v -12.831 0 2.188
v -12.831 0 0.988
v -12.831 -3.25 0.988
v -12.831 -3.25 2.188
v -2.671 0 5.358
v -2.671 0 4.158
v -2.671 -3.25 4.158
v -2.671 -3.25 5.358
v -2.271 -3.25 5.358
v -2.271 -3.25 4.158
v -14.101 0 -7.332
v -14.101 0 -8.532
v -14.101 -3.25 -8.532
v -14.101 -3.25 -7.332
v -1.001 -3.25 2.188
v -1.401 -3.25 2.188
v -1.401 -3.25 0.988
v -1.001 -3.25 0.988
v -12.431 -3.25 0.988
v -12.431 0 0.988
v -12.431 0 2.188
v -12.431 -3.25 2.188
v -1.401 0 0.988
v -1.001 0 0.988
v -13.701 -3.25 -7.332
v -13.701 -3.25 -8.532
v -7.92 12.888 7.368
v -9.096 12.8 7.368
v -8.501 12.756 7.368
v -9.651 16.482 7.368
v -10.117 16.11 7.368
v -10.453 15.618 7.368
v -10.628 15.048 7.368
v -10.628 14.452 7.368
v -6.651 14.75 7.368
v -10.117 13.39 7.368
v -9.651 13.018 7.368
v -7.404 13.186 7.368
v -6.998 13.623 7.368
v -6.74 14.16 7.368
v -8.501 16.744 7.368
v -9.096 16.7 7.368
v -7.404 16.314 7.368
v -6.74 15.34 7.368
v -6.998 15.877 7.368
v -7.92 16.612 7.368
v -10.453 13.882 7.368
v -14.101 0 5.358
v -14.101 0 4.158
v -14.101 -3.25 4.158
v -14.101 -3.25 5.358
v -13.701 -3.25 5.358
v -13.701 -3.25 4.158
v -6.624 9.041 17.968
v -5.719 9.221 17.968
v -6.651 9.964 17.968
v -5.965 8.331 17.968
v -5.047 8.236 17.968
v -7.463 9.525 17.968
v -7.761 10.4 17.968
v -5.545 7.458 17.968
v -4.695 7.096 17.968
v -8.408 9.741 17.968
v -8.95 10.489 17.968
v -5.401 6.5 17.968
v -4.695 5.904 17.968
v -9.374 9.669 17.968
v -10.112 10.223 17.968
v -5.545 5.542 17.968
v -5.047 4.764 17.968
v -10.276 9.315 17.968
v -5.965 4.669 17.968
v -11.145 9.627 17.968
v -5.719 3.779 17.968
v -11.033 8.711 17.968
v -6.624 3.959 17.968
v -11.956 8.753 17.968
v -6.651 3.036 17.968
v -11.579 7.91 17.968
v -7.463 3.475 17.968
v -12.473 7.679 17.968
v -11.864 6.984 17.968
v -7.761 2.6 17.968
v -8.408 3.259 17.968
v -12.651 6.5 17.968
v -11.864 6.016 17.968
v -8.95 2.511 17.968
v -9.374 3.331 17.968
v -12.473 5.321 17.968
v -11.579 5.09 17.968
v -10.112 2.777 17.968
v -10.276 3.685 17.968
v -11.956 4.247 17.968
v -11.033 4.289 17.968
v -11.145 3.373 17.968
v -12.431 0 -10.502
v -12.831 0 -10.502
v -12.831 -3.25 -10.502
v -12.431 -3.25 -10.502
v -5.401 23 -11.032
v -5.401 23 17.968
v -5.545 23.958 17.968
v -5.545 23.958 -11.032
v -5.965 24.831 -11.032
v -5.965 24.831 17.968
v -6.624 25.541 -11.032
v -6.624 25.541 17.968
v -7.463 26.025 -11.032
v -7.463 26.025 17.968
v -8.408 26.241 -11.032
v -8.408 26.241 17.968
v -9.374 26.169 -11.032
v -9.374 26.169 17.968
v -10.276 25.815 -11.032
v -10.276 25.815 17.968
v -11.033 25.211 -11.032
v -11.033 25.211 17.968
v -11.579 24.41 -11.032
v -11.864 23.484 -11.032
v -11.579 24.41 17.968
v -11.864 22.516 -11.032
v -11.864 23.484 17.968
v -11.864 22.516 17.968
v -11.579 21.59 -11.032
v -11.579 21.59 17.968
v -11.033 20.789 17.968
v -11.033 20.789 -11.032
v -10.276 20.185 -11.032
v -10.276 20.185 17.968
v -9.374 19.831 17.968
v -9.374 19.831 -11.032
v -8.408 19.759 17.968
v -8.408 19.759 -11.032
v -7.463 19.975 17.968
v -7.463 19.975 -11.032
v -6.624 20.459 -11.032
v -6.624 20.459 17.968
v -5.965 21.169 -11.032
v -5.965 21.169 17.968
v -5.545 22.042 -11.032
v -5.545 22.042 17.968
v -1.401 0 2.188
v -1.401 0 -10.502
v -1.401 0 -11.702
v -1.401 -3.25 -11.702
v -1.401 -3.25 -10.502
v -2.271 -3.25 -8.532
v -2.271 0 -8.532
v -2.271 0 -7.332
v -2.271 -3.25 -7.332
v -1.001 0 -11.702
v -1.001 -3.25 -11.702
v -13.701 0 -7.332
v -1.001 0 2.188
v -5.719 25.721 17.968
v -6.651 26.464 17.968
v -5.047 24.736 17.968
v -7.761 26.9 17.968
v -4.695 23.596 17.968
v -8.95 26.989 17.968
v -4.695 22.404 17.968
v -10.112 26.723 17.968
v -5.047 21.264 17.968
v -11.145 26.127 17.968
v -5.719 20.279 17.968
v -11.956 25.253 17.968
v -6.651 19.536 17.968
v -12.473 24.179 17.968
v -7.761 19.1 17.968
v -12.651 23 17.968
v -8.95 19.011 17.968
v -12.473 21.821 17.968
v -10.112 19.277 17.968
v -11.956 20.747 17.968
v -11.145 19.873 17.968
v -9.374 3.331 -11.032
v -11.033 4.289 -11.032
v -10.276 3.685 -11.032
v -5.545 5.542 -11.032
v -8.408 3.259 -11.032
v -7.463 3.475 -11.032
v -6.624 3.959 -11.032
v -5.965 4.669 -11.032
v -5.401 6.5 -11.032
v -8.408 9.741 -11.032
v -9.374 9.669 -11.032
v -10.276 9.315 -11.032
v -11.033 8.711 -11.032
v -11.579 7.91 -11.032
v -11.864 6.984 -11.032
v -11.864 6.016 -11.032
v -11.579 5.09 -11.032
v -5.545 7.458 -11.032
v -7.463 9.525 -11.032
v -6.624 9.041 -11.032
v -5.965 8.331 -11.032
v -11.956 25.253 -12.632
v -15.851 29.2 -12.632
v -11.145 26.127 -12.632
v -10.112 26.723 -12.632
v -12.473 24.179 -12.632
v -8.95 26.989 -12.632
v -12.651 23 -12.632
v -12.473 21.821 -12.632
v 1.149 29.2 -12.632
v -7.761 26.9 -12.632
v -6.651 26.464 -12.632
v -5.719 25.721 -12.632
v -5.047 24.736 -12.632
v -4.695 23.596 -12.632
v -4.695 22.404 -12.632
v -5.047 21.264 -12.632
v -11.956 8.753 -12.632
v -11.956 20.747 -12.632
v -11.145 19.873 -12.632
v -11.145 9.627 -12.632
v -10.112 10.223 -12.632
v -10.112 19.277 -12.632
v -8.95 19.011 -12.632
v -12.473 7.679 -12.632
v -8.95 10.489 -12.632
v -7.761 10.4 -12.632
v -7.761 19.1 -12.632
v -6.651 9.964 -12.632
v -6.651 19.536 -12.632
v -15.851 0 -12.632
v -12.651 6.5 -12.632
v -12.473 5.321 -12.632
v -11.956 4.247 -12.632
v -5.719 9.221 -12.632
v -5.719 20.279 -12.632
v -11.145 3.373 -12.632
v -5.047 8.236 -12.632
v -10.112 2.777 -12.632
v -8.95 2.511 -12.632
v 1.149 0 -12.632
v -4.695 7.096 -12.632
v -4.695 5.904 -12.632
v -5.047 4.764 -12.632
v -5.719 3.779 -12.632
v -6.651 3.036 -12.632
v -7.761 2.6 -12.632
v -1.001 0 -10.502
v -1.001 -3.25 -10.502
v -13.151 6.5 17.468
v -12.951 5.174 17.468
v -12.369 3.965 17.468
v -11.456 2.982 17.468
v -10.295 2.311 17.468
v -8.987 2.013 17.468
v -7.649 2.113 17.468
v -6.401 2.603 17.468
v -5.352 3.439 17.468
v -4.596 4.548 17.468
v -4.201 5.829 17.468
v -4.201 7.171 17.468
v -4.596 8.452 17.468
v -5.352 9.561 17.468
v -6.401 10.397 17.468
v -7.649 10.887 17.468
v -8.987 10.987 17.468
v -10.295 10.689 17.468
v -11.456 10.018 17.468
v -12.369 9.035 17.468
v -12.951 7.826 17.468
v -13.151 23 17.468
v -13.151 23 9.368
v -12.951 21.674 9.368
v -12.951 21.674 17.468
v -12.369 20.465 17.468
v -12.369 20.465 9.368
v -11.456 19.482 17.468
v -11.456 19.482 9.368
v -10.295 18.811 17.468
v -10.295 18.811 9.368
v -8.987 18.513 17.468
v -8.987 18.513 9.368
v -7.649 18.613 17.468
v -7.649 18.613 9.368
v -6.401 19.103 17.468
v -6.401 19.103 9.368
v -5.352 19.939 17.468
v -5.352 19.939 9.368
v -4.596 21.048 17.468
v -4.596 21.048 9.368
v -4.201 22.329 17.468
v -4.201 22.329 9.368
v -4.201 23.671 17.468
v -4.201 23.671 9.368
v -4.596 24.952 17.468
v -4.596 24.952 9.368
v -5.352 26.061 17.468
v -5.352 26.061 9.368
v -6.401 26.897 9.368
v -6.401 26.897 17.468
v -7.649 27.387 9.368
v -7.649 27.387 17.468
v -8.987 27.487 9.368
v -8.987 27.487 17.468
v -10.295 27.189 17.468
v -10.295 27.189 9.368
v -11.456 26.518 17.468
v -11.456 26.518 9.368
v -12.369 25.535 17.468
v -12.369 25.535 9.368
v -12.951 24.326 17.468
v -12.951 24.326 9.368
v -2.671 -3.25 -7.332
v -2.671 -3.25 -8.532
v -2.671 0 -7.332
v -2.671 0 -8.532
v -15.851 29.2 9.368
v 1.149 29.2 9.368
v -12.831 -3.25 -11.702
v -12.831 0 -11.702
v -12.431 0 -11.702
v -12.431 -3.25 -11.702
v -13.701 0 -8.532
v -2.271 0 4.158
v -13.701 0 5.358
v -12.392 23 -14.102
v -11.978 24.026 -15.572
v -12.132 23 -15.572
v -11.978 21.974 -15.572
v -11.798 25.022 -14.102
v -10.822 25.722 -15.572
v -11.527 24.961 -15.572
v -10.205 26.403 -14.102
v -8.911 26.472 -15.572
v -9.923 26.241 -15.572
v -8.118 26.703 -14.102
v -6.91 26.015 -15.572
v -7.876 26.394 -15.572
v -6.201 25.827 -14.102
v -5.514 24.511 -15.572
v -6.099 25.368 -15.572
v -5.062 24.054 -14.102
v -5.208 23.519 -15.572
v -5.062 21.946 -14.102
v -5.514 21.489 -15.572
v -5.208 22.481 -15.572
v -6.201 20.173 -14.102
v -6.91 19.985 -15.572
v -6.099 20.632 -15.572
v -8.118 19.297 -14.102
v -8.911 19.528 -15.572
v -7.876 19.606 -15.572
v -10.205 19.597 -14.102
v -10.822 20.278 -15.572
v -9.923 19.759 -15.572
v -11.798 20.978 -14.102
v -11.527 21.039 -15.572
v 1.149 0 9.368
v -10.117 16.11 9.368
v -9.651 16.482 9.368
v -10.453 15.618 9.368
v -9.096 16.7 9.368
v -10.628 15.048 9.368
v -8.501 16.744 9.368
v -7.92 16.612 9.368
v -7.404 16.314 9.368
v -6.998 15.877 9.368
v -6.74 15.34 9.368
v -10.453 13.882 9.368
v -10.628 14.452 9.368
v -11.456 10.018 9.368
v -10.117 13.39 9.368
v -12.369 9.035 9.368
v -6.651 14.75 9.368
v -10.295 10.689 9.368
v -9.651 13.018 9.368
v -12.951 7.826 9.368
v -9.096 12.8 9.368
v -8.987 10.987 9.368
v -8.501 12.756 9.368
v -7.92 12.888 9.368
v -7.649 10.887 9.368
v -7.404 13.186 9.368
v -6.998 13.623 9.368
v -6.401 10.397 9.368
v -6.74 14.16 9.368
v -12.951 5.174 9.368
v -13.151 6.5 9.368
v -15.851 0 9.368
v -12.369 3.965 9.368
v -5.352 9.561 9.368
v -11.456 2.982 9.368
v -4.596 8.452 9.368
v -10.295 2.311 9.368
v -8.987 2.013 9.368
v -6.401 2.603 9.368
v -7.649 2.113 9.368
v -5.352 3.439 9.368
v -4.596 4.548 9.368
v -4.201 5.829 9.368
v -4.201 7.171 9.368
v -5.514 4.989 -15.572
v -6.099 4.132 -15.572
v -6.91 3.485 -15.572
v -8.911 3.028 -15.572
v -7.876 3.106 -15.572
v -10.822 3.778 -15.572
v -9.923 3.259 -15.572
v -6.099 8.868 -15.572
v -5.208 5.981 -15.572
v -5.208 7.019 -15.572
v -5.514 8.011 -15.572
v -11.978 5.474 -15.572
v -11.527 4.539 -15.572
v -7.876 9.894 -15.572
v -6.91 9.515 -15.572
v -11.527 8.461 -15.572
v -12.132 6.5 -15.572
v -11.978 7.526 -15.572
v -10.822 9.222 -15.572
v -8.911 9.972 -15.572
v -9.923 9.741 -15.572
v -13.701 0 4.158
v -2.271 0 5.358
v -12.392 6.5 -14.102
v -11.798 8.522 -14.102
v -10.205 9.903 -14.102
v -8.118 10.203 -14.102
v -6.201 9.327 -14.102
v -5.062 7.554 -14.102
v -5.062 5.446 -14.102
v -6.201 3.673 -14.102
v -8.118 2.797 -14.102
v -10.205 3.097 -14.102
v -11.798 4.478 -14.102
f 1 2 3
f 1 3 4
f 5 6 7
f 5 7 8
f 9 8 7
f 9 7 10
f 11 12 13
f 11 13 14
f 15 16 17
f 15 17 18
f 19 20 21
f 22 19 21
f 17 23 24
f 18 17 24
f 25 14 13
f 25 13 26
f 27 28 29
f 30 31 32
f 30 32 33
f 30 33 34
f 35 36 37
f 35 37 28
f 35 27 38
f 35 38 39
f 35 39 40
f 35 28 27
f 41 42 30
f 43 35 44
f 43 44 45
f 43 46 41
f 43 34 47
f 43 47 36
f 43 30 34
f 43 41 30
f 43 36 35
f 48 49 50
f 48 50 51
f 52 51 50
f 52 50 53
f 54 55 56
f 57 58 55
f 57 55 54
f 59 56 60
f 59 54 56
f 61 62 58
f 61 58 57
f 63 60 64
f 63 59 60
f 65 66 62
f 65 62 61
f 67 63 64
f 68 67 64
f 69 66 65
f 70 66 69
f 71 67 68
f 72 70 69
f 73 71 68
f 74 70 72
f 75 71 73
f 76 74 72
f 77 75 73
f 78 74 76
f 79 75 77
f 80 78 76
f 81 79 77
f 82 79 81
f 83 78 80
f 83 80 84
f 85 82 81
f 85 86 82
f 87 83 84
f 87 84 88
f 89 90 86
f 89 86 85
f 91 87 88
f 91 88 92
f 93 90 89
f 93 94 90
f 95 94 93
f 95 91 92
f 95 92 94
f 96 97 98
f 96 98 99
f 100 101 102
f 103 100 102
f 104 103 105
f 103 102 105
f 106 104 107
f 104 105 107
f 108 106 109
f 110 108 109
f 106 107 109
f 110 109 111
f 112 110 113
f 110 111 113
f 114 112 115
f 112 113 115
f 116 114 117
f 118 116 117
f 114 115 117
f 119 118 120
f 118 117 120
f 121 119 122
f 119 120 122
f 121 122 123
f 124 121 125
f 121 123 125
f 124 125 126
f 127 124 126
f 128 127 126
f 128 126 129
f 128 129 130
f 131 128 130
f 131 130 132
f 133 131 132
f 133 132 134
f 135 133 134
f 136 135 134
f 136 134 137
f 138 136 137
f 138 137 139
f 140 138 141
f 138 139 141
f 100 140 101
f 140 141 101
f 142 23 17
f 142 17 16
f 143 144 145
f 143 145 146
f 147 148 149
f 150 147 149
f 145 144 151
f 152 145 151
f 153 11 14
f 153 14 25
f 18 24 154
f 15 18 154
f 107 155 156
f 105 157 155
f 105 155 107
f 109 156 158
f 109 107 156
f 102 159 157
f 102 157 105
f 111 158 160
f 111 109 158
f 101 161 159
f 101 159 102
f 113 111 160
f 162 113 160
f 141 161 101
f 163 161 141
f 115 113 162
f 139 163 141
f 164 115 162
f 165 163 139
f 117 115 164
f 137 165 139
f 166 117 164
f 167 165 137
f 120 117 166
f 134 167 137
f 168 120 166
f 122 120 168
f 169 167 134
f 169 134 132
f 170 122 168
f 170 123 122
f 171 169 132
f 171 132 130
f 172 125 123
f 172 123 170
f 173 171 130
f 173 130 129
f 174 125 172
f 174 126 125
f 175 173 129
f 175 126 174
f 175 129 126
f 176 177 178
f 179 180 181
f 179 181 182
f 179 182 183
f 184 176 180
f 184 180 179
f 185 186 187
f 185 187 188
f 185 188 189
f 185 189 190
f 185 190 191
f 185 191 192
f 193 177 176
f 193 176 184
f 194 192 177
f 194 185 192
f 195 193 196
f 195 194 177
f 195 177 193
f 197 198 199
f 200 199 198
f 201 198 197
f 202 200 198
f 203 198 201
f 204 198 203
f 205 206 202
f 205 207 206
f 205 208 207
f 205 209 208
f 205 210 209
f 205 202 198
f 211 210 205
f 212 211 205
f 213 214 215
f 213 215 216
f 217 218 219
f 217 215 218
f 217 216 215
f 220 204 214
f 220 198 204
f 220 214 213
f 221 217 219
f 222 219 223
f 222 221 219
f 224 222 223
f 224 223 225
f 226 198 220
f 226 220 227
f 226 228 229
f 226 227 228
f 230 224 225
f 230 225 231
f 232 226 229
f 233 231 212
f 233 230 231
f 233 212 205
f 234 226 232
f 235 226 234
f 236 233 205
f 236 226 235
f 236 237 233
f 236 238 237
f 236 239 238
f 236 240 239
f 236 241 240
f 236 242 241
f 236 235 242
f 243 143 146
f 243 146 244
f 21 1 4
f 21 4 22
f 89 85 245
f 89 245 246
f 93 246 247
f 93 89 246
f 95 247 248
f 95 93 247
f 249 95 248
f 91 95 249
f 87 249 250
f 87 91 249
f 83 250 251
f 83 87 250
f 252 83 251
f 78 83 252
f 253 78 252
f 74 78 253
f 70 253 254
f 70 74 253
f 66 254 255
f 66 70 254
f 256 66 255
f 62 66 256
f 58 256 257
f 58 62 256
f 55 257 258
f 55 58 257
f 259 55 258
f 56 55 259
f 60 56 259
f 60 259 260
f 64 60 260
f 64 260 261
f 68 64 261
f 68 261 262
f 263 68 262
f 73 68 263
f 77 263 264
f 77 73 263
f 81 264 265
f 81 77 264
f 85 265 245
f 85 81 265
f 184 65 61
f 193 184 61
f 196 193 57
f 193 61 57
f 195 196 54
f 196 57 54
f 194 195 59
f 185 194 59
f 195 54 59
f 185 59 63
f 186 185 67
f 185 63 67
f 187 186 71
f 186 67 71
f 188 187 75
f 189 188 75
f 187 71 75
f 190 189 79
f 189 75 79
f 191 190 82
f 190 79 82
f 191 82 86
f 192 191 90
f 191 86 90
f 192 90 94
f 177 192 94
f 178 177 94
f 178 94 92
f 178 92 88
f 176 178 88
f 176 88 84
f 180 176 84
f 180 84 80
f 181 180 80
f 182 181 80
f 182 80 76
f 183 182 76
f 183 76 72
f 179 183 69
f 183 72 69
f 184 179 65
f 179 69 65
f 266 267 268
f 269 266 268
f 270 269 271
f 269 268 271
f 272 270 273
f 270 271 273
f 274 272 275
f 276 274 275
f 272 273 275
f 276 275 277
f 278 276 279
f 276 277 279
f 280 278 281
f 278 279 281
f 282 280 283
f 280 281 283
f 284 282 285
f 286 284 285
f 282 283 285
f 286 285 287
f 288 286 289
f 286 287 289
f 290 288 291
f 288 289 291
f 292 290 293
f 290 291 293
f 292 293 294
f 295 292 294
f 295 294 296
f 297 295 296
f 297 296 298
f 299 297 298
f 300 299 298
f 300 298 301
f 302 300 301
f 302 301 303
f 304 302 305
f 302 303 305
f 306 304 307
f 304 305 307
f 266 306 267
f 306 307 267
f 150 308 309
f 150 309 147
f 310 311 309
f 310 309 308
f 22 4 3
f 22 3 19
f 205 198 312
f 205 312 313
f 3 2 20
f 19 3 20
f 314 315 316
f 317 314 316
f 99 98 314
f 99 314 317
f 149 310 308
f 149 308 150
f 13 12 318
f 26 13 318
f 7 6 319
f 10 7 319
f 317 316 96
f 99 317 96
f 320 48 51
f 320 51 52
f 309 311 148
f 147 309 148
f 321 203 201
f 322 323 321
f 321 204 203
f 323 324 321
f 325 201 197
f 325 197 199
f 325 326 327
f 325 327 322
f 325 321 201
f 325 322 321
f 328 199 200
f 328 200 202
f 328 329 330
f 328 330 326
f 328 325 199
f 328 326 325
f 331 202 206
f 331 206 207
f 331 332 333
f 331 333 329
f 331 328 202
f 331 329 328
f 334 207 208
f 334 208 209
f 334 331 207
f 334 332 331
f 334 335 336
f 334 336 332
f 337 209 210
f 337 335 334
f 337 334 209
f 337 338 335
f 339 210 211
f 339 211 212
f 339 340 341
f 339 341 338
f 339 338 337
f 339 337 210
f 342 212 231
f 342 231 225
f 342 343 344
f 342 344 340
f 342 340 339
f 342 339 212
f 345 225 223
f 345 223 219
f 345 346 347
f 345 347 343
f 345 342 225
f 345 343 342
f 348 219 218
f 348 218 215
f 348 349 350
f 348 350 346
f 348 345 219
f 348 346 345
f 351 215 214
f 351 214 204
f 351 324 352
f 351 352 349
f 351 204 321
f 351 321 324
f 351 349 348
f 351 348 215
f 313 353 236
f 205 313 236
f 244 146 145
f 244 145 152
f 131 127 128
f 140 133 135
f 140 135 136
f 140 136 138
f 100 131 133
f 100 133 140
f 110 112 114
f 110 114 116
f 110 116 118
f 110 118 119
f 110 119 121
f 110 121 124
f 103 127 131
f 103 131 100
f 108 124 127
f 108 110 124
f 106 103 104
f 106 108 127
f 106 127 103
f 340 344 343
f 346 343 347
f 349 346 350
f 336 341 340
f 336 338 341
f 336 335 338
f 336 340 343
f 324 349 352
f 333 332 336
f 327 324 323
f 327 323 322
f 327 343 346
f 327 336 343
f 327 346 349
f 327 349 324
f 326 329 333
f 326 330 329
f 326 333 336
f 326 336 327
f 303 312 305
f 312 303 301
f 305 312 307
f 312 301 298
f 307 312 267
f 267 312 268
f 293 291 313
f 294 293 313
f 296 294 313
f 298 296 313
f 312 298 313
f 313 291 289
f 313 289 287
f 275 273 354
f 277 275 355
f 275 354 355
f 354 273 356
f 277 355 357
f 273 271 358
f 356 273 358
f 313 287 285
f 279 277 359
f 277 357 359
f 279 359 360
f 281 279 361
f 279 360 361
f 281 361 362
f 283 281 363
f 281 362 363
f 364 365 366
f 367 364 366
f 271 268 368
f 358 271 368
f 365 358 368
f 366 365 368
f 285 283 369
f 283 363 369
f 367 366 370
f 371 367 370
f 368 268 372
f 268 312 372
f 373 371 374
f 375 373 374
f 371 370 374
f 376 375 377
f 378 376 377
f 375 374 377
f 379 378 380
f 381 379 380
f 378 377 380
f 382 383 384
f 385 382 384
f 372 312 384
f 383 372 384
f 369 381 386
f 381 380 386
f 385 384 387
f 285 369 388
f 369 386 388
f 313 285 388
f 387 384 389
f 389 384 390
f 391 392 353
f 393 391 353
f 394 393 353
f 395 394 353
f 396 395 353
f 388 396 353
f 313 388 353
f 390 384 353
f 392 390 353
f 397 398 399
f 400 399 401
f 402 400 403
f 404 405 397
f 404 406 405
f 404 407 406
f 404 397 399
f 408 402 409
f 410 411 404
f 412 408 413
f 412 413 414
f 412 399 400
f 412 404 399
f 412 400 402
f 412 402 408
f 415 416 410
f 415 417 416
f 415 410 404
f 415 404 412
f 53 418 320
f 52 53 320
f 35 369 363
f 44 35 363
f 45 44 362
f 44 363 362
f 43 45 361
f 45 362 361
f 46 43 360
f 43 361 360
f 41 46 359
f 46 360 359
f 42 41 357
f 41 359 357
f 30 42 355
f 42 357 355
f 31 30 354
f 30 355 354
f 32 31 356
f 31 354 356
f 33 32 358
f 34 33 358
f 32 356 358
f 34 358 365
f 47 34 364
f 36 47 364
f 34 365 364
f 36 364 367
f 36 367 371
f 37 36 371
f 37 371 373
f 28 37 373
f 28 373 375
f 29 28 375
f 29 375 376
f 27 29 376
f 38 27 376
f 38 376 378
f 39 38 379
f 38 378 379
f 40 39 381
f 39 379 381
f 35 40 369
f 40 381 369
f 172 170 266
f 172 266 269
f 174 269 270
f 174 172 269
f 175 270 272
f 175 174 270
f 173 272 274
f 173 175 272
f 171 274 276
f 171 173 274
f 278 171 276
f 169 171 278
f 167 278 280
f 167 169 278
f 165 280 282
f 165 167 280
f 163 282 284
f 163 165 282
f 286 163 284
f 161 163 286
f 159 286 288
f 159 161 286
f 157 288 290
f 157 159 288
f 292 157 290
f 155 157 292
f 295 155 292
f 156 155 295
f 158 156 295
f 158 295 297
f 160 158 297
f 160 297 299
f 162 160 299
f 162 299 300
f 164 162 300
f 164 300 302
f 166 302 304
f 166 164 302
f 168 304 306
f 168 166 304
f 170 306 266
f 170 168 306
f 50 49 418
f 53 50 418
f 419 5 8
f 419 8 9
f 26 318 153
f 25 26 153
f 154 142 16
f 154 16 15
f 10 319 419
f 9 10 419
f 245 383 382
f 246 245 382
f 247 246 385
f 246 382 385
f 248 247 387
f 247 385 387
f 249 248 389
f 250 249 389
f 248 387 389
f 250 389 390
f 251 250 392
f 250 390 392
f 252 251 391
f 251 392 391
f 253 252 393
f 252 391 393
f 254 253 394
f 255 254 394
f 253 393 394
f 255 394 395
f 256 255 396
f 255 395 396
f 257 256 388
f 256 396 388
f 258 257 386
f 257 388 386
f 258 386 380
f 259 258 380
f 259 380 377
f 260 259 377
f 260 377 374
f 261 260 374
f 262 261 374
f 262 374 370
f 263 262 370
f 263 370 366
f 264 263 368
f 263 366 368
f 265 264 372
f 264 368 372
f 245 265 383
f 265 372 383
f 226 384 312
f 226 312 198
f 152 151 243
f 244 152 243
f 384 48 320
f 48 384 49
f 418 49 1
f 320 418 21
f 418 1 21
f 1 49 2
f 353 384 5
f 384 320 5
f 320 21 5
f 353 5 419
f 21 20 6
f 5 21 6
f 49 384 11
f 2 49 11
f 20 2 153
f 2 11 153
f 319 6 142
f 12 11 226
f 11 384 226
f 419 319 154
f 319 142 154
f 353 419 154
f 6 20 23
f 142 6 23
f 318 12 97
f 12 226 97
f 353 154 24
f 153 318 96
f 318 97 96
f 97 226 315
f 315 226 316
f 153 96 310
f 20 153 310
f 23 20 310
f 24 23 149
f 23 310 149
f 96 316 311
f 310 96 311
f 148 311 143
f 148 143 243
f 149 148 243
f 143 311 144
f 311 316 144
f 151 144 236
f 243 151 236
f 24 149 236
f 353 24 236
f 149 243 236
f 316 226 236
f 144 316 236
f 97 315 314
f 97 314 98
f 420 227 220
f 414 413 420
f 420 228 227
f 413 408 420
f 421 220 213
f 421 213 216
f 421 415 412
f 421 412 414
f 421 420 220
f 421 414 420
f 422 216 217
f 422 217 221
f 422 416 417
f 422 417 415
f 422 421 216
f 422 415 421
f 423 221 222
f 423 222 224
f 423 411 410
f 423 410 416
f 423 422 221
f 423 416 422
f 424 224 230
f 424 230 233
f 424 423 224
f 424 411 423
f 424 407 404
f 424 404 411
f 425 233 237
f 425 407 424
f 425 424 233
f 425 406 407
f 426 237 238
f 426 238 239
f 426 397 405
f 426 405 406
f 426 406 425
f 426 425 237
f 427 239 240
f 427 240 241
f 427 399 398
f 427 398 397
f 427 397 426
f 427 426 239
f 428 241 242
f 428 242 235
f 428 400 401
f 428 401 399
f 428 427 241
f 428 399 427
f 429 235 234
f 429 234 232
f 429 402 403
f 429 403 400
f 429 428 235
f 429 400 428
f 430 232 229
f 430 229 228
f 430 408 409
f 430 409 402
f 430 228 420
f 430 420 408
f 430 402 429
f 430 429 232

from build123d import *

# Parameters (mm, degrees)
SKETCH1_W                  = 17
SKETCH1_H                  = 22
BOSS_EXTRUDE1_DEPTH        = 29.2
SKETCH3_R                  = 4
BOSS_EXTRUDE2_DEPTH        = 2.94
BOSS_EXTRUDE2_TAPER        = 10
SKETCH4_R                  = 4.5
BOSS_EXTRUDE3_DEPTH        = 8.6
CHAMFER1_SIZE              = 0.5
SKETCH13_R                 = 3.25
CUT_EXTRUDE1_DEPTH         = 29
SKETCH14_W                 = 0.4
SKETCH14_H                 = 1.2
BOSS_EXTRUDE4_DEPTH        = 3.25
LPATTERN1_COUNT            = 2
LPATTERN1_PITCH            = 16.5
CHAMFER1_OF_LPATTERN1_SIZE = 0.5
LPATTERN2_COUNT            = 2
LPATTERN2_PITCH            = 3.17
LPATTERN2_COUNT_DIR2       = 2
LPATTERN2_PITCH_DIR2       = 1.27
SKETCH15_R                 = 2
CUT_EXTRUDE2_DEPTH         = 2


with BuildPart() as part:
    # Sketch1 → Boss-Extrude1 (new body)
    with BuildSketch(Plane(origin=(0, 0, 0), x_dir=(1, 0, 0), z_dir=(0, 1, 0))):
        with Locations((-7.350772662, 1.631732914)):
            Rectangle(SKETCH1_W, SKETCH1_H)
    extrude(amount=BOSS_EXTRUDE1_DEPTH)

    # Sketch3 → Boss-Extrude2 (add)
    with BuildSketch(Plane(origin=(0, 0, -12.631732914), x_dir=(-1, 0, 0), z_dir=(0, 0, -1))):
        with Locations((8.650772662, 6.5)):
            Circle(SKETCH3_R)
    boss_extrude2 = extrude(amount=BOSS_EXTRUDE2_DEPTH, taper=BOSS_EXTRUDE2_TAPER)

    # Sketch4 → Boss-Extrude3 (add)
    with BuildSketch(Plane.XY.offset(9.368267086)):
        with Locations(Location((-8.650772662, 6.5, 0), (0, 0, 180))):
            Circle(SKETCH4_R)
    boss_extrude3 = extrude(amount=BOSS_EXTRUDE3_DEPTH)

    # Chamfer1
    chamfer1_edges = [part.edges().sort_by_distance(p)[0] for p in [
        (-4.150772662, 6.5, 17.968267086),
    ]]
    chamfer(chamfer1_edges, length=CHAMFER1_SIZE)

    # Sketch13 → Cut-Extrude1 (cut)
    with BuildSketch(Plane.XY.offset(17.968267086)):
        with Locations((-8.650772662, 6.5)):
            Circle(SKETCH13_R)
    cut_extrude1 = extrude(amount=-CUT_EXTRUDE1_DEPTH, mode=Mode.SUBTRACT)

    # Sketch14 → Boss-Extrude4 (add)
    with BuildSketch(Plane.XZ):
        with Locations((-13.900772662, 4.758267086)):
            Rectangle(SKETCH14_W, SKETCH14_H)
        with Locations((-2.470772662, 4.758267086)):
            Rectangle(SKETCH14_W, SKETCH14_H)
        with Locations((-2.470772662, -7.931732914)):
            Rectangle(SKETCH14_W, SKETCH14_H)
        with Locations((-13.900772662, -7.931732914)):
            Rectangle(SKETCH14_W, SKETCH14_H)
    boss_extrude4 = extrude(amount=BOSS_EXTRUDE4_DEPTH)

    # LPattern1: Boss-Extrude2, Boss-Extrude3, Cut-Extrude1 ×2
    with Locations(*[(0, i * LPATTERN1_PITCH, 0) for i in range(1, LPATTERN1_COUNT)]):
        add(boss_extrude2)
        add(boss_extrude3)
        add(cut_extrude1, mode=Mode.SUBTRACT)

    # Chamfer1 of LPattern1
    chamfer1_of_lpattern1_edges = [part.edges().sort_by_distance(p)[0] for p in [
        (-4.150772662, 23, 17.968267086),
    ]]
    chamfer(chamfer1_of_lpattern1_edges, length=CHAMFER1_OF_LPATTERN1_SIZE)

    # LPattern2: Boss-Extrude4 2 × 2, 2 skipped
    with Locations(*[(j * LPATTERN2_PITCH_DIR2, 0, -i * LPATTERN2_PITCH) for i in range(LPATTERN2_COUNT) for j in range(LPATTERN2_COUNT_DIR2) if (i, j) not in ((0, 0), (0, 1), (1, 0))]):
        add(boss_extrude4)

    # Sketch15 → Cut-Extrude2 (cut)
    with BuildSketch(Plane.XY.offset(9.368267086)):
        with Locations((-8.650772662, 14.75)):
            Circle(SKETCH15_R)
    extrude(amount=-CUT_EXTRUDE2_DEPTH, mode=Mode.SUBTRACT)


solid = part.part
